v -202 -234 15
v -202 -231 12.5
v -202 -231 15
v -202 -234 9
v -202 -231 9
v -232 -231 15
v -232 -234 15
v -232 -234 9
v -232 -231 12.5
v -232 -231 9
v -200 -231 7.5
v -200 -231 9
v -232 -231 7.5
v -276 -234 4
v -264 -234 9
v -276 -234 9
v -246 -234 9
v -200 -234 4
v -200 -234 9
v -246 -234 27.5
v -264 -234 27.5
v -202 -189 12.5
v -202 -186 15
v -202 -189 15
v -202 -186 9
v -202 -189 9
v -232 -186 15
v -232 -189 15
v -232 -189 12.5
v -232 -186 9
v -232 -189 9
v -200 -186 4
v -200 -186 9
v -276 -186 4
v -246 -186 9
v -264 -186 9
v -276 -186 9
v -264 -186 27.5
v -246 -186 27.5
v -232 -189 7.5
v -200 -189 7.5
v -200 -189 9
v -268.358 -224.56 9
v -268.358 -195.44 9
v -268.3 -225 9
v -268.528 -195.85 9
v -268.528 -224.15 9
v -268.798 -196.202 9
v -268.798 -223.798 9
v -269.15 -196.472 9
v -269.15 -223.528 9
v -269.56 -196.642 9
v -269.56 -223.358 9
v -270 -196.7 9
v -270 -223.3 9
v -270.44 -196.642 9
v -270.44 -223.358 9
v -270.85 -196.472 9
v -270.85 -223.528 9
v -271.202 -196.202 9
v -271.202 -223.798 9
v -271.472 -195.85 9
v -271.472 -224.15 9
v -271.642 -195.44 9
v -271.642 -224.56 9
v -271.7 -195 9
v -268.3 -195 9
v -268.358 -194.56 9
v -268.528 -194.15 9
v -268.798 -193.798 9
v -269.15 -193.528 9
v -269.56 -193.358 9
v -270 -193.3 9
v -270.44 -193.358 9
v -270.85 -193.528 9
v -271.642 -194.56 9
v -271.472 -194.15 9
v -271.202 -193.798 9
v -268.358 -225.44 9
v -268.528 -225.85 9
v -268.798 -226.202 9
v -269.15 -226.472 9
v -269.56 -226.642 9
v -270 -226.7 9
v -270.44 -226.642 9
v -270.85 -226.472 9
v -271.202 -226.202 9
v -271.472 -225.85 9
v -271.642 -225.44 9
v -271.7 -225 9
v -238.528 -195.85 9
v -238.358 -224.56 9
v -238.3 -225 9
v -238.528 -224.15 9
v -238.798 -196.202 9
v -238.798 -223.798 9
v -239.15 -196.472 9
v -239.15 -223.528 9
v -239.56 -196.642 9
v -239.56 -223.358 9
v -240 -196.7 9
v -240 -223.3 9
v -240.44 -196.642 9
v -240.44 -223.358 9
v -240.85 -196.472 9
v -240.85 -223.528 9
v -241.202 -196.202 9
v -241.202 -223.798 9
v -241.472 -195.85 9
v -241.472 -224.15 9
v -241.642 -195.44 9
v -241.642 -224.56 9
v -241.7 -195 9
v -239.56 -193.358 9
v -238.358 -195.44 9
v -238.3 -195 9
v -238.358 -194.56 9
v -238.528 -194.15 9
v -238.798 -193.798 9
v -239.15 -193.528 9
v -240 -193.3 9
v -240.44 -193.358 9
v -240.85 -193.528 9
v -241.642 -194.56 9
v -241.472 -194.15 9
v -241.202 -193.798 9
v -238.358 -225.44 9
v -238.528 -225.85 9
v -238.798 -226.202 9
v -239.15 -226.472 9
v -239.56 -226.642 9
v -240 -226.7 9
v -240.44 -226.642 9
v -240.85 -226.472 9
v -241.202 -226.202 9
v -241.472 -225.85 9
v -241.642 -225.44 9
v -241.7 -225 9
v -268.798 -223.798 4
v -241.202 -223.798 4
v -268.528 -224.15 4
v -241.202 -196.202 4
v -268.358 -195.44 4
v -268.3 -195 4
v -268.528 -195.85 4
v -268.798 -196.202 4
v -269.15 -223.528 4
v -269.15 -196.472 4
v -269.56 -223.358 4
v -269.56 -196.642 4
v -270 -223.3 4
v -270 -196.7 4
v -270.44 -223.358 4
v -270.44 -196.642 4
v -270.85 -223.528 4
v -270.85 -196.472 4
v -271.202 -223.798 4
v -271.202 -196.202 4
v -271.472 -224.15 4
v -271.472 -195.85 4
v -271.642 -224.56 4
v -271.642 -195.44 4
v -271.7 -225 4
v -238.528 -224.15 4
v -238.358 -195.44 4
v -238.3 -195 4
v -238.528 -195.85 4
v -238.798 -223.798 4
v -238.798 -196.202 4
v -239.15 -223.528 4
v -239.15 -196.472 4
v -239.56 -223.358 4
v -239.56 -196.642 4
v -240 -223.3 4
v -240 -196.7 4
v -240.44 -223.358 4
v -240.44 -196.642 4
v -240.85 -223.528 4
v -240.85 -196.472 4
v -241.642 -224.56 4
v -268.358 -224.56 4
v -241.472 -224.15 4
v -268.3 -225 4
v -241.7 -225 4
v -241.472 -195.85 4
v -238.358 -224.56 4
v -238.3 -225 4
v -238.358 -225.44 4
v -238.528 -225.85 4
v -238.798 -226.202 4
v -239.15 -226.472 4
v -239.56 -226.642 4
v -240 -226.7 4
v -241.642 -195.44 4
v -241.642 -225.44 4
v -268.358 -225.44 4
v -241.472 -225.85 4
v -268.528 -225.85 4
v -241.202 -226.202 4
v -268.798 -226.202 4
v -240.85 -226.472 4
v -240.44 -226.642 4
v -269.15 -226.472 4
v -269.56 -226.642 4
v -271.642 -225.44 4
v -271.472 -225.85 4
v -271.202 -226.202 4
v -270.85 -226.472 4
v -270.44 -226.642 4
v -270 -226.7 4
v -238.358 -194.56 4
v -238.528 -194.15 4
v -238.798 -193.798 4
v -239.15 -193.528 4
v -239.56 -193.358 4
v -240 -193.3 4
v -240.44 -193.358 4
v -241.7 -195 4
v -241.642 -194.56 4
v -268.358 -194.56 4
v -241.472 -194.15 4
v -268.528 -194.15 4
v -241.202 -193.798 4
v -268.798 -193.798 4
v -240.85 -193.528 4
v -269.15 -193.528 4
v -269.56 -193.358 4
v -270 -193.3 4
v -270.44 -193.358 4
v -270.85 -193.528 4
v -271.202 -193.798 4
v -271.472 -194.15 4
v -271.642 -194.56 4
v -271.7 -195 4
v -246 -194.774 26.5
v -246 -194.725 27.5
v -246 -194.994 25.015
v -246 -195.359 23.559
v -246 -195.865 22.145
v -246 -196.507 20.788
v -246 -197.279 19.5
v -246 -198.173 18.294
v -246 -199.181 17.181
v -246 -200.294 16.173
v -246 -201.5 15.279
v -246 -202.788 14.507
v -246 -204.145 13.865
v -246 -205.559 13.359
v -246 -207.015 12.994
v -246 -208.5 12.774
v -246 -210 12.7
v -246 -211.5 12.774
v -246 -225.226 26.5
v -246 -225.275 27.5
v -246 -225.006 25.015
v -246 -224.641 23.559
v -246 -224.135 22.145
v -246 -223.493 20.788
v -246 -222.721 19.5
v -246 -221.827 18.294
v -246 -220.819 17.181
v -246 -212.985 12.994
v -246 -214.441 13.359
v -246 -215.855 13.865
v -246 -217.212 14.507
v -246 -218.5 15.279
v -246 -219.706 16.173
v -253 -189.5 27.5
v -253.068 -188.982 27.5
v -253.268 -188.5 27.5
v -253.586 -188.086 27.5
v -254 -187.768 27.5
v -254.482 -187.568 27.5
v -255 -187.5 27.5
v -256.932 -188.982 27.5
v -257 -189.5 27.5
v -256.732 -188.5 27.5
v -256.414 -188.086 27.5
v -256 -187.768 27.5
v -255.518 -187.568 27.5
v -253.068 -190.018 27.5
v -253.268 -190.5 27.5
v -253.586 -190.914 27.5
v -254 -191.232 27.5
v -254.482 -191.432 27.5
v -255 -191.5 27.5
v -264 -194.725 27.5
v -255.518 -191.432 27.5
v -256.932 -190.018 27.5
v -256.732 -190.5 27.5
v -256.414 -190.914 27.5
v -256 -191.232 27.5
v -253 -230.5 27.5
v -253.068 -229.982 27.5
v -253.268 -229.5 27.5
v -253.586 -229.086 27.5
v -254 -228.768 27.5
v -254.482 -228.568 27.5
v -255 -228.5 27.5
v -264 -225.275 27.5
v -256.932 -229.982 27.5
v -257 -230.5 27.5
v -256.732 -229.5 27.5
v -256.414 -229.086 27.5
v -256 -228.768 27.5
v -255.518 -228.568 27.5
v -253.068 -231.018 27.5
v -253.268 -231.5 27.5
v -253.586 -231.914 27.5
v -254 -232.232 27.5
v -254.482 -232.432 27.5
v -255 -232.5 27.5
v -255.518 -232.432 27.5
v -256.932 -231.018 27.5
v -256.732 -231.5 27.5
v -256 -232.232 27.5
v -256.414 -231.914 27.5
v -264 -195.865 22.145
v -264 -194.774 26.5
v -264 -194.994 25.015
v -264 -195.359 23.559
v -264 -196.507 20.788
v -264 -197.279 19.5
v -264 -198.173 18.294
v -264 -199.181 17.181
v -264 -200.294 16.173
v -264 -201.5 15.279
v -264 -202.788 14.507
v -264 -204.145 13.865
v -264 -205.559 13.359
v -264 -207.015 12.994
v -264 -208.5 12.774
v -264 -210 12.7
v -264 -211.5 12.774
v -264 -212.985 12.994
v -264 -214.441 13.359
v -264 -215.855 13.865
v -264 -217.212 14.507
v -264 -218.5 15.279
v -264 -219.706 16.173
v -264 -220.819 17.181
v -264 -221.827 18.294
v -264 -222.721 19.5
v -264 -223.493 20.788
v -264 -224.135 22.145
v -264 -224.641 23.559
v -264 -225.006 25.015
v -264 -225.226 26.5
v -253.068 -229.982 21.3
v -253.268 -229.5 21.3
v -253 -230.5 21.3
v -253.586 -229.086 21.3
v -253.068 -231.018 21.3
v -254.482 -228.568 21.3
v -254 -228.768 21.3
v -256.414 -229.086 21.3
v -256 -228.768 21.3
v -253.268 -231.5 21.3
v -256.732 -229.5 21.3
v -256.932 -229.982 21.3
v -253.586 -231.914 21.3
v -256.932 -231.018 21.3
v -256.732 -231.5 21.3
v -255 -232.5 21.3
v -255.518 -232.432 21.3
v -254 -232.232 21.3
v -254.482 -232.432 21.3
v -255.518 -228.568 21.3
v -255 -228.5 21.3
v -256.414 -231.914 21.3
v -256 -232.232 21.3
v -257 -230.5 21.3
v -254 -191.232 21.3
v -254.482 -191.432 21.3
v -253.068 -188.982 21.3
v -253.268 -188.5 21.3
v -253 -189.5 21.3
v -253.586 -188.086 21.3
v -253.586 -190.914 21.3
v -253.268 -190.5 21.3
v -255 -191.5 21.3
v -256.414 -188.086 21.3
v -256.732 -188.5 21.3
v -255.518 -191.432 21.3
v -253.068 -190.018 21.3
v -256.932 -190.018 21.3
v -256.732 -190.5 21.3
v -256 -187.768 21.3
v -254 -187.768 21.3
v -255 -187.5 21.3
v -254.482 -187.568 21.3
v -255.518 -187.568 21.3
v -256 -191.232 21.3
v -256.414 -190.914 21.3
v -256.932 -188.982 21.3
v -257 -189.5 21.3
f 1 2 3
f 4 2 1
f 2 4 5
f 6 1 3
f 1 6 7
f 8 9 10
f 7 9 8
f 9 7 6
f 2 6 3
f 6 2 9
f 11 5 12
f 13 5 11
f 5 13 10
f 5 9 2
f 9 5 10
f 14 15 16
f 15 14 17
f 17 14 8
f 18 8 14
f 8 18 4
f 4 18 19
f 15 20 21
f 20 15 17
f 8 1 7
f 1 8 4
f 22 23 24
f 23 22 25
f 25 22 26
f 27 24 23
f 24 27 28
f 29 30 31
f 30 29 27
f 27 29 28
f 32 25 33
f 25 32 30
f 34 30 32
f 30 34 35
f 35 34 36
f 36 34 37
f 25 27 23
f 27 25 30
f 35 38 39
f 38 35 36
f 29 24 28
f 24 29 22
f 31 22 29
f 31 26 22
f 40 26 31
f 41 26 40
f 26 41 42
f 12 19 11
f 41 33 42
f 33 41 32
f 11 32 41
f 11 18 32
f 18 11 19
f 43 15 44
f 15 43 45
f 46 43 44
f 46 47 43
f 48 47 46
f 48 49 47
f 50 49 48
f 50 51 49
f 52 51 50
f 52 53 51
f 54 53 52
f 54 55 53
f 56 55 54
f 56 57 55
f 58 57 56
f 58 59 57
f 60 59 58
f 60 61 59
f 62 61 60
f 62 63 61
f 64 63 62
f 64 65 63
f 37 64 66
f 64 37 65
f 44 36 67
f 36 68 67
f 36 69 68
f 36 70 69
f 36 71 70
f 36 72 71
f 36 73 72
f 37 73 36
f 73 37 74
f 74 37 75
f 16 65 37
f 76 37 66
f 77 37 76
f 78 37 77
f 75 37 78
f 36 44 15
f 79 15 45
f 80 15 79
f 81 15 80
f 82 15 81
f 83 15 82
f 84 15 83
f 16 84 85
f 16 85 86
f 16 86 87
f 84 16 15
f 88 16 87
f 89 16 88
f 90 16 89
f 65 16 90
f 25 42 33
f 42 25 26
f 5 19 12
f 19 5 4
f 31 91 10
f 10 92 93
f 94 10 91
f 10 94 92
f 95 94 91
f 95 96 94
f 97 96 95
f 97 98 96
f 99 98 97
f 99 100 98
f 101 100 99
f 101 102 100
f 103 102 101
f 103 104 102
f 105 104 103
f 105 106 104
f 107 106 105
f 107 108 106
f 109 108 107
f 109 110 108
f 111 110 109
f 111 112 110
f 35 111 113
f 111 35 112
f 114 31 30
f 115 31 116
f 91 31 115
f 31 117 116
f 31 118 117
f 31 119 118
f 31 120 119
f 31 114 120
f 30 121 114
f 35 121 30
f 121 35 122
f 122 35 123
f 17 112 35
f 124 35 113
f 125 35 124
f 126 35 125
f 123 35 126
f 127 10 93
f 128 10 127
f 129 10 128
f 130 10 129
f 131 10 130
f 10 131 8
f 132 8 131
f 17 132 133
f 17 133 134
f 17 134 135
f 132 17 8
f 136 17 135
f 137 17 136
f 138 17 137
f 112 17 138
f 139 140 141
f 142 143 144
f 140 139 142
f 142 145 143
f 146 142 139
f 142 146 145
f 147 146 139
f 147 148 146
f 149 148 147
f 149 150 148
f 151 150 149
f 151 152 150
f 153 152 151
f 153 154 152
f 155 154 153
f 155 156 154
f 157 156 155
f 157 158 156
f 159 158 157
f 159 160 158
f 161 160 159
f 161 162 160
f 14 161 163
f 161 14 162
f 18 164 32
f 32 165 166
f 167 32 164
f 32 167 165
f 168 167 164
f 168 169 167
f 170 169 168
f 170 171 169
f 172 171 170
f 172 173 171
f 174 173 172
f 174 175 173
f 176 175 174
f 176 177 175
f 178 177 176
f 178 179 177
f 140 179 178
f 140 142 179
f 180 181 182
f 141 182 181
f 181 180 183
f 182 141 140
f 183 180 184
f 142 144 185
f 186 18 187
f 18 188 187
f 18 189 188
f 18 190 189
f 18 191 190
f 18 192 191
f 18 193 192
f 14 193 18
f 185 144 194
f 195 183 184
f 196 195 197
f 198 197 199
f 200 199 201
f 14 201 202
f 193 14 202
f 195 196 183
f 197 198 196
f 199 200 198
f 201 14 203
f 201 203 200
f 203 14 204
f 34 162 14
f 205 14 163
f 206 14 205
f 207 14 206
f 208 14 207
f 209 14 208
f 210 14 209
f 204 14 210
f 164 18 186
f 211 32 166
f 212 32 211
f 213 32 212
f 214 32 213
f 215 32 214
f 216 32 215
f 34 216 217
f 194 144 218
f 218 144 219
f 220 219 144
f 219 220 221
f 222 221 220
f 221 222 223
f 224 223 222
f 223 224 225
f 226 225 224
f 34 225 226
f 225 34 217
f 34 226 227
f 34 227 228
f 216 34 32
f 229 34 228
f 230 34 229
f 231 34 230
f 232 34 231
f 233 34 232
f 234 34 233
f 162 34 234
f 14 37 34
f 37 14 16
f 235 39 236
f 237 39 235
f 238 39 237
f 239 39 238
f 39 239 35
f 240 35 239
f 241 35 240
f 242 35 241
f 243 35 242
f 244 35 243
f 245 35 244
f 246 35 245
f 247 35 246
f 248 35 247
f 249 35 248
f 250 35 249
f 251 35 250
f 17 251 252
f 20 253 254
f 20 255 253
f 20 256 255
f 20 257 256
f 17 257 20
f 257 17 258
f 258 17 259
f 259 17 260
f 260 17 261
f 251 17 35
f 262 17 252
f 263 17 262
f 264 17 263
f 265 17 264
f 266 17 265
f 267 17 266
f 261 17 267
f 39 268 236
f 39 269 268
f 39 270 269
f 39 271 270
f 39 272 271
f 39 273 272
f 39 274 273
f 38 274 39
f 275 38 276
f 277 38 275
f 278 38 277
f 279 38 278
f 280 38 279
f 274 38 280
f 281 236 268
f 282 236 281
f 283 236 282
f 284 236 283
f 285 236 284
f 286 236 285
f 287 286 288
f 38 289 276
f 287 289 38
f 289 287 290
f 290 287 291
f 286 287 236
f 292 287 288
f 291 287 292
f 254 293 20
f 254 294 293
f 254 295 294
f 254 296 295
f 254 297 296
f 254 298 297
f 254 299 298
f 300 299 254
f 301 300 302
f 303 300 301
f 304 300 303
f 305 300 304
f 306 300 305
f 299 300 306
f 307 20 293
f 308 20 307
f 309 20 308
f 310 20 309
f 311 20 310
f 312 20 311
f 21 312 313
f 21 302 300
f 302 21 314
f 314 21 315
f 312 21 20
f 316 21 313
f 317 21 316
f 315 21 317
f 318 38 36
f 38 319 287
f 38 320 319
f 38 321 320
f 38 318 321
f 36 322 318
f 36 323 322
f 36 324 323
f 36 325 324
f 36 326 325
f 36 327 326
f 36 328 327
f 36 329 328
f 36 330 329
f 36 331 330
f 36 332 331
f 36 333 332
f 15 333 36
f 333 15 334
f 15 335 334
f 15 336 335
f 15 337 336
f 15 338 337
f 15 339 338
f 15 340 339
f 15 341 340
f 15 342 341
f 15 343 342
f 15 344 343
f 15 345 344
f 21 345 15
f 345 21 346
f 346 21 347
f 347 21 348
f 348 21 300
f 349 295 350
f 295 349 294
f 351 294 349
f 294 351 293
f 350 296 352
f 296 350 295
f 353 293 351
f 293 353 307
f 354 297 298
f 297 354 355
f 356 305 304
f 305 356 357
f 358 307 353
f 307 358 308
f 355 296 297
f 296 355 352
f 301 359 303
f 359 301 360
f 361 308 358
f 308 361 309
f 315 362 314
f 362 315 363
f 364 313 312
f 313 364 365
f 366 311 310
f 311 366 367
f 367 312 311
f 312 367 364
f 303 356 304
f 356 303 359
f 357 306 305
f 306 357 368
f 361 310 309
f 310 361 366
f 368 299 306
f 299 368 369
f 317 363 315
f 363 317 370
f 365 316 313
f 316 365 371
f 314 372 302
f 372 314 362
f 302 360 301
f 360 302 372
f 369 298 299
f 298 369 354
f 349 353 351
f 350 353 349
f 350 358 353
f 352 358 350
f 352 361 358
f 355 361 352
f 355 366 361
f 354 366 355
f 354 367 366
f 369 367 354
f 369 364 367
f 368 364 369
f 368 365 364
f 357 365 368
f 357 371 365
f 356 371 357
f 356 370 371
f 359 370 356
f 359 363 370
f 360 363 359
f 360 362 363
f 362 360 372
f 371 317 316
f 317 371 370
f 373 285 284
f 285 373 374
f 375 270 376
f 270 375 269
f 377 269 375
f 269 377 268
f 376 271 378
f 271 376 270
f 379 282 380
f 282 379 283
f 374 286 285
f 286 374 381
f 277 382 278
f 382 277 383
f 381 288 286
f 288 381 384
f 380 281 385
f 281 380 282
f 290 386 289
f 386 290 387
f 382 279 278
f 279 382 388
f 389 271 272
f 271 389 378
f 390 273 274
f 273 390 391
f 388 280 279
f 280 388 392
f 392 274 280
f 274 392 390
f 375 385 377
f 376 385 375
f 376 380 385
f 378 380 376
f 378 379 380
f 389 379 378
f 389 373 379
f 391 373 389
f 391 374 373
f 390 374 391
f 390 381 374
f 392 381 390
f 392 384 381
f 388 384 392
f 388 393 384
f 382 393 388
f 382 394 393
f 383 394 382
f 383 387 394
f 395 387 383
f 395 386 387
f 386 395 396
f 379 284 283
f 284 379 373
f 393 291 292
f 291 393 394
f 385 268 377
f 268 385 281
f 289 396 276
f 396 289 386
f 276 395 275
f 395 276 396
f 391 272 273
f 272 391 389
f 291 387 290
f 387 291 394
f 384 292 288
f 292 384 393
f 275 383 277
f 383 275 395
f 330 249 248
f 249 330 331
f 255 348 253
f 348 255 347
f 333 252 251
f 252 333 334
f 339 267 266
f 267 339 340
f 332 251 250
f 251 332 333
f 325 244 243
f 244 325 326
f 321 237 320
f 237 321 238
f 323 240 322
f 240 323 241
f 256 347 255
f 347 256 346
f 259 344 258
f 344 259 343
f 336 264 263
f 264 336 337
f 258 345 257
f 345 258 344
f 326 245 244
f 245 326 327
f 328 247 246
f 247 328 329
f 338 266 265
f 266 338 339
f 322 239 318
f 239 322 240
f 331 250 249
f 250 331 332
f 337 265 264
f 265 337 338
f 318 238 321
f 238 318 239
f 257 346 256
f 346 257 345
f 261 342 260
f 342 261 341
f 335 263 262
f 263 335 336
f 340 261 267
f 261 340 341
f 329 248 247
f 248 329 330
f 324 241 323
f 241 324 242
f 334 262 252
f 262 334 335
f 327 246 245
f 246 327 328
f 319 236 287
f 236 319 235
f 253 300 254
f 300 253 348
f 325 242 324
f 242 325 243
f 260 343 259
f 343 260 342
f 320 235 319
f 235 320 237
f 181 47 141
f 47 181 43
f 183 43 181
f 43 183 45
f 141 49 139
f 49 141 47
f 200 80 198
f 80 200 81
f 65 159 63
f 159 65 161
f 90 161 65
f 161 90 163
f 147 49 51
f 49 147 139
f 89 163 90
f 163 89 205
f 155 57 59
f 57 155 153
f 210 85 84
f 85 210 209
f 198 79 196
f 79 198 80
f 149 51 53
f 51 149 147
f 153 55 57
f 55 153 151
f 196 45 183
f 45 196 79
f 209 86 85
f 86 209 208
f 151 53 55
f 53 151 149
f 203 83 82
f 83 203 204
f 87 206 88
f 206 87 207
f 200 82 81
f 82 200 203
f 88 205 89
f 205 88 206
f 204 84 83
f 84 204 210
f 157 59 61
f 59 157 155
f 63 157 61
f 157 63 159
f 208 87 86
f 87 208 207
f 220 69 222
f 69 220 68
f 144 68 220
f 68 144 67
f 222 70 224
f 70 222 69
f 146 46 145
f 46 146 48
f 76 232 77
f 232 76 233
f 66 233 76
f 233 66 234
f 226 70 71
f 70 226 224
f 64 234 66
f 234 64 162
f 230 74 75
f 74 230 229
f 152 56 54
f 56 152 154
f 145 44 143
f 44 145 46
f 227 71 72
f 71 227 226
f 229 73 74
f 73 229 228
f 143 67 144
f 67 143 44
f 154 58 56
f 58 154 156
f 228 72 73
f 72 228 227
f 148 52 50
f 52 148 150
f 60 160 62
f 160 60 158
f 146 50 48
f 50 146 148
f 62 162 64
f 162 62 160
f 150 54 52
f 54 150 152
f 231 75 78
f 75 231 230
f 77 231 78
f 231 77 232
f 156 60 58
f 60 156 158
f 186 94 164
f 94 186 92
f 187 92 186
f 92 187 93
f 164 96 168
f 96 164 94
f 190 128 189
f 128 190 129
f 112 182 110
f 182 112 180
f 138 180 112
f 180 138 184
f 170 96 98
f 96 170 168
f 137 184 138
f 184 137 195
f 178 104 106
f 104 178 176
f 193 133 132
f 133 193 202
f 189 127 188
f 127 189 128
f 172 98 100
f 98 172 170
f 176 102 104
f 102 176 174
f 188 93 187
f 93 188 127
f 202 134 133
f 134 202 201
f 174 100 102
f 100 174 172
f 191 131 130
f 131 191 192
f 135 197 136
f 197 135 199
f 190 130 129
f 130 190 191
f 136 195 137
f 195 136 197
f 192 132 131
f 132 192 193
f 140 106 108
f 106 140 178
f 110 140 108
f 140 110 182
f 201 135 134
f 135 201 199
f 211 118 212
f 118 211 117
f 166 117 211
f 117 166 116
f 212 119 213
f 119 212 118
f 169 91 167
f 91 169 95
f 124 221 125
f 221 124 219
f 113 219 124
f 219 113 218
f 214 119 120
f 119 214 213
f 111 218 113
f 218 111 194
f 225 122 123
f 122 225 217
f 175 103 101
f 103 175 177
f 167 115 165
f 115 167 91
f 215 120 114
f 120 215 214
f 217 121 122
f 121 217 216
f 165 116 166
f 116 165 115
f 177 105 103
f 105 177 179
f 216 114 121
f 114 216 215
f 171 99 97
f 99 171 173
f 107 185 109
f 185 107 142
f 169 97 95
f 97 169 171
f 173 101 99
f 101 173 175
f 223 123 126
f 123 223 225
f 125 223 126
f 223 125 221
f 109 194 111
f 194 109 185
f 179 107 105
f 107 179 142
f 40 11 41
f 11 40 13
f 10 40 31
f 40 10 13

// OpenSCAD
// file: ../machine_frame.scad
// =============================================
// Riftbound Card Sorter — shared machine frame
// =============================================
// Single source of truth for the card path after the Nov 11 redesign
// (suction pick from a motor-raised hopper, raised transport line,
// cradle shuttle sorter). Machine coords as in assembly.scad:
//   X = card travel (hopper -> belt -> tray), Y = across belt (+Y = back,
//   electronics side), Z = up, Z=0 bottom of baseplate tiles.
// `use <machine_frame.scad>` does not import variables, so read these via
// the functions at the bottom.
// =============================================

base_top   = 4;      // top of baseplate tiles
riser_h    = 60;     // conveyor deck raised so cards can FALL into both tray floors
deck_z     = base_top + riser_h;          // rail base / hopper deck reference = 64

// Conveyor (geometry unchanged, just lifted by riser_h)
belt_x0    = -165;   // belt start
belt_x1    = 85;     // belt end
roller_x   = [-140, 60];
rail_in    = 45;     // |Y| of rail inner faces
shaft_z    = deck_z + 15;
card_z     = deck_z + 15 + 11.9;          // top of round belts = card face = 90.9
scan_flat  = [-127, 47];                  // slide-bed backed flat zone (X)

// Scanner
cam_x      = 5;      // lens axis; card centred here for capture (moved from -40 so the hood clears the arm drop zone at X -139..-51)

// Hopper (motor-raised floor keeps top card at card_z)
hopper_x   = -215;   // cavity centre X (Y = 0)

// Baseplate extents (3x3 tiles of 190x180)
base_x     = [-285, 285];
base_y     = [-270, 270];

// Pick & place hand-off
drop_x     = -95;    // card CENTRE when the suction arm releases it onto the belt
                     // (card spans -139..-51: on belts, clear of hopper wall)
drop_clear = 3;      // card underside this far above belt at release (low drop)

// Sorting tray (bottom on baseplate); owner of tray placement may move it in X
tray_floor_lower_z = base_top + 2.5;      // lower slot floor
tray_floor_upper_z = base_top + 65 + 3 + 2.5;  // = 74.5 upper slot floor

// Card
card_w = 63; card_l = 88; card_t = 0.33;  // RAW cards (owner confirmed 2026-11-11: no sleeves), ~1.75 g

// MG996R mounting-tab holes (all three servos: pick arm ch0, shuttle ch1 / ch2).
// ONE value for every mount: hole-centre pitch along the case (49.5, TowerPro
// MG996R drawing) × across it (10), symmetric about the case centre. Clones
// vary (48.5..50 seen); the servo's own tab holes are Ø4.5+ grommet holes, so
// an M3 / M2.5 still lands for ±0.7 mm. MEASURE YOUR SERVO; if it is further
// off, change it here and re-export the arm head and the shuttle end post / riser.
mg996r_hole_pitch = 49.5;
mg996r_hole_dx    = 10;

function frame_base_top()  = base_top;
function frame_riser_h()   = riser_h;
function frame_deck_z()    = deck_z;
function frame_belt_x0()   = belt_x0;
function frame_belt_x1()   = belt_x1;
function frame_roller_x()  = roller_x;
function frame_rail_in()   = rail_in;
function frame_card_z()    = card_z;
function frame_scan_flat() = scan_flat;
function frame_cam_x()     = cam_x;
function frame_hopper_x()  = hopper_x;
function frame_base_x()    = base_x;
function frame_base_y()    = base_y;
function frame_drop_x()    = drop_x;
function frame_drop_clear()= drop_clear;
function frame_tray_floor_lower_z() = tray_floor_lower_z;
function frame_tray_floor_upper_z() = tray_floor_upper_z;
function frame_mg996r_hole_pitch() = mg996r_hole_pitch;
function frame_mg996r_hole_dx()    = mg996r_hole_dx;
// file: hw_common.scad
// Visual-only hardware for the v3 assembly video (render_v2/w_*.scad). Not printed.
// Screws are drawn with the origin at the underside of the head (the bearing face)
// and the tip along `dir` (default straight down). Lengths are nominal (mm).

// rotate so that local -Z points along v
module point_tip(v = [0, 0, -1]) {
    n = norm(v); u = v / n;
    if (u[2] < -0.9999) children();
    else if (u[2] > 0.9999) rotate([180, 0, 0]) children();
    else rotate(a = acos(-u[2]), v = cross([0, 0, -1], u)) children();
}

// socket head cap screw: head Ø5.5 × 3 above the origin, shank down
module shcs(L, d = 3, hd = 5.5, hh = 3) {
    cylinder(d = hd, h = hh, $fn = 20);
    translate([0, 0, -L]) cylinder(d = d, h = L + 0.01, $fn = 12);
}
// button head (ISO 7380)
module bhcs(L, d = 3, hd = 5.7, hh = 1.65) {
    cylinder(d1 = hd, d2 = hd * 0.75, h = hh, $fn = 20);
    translate([0, 0, -L]) cylinder(d = d, h = L + 0.01, $fn = 12);
}
// countersunk (ISO 10642): head top at the origin, cone below it
module csk(L, d = 3, hd = 6) {
    translate([0, 0, -(hd - d) / 2]) cylinder(d1 = d, d2 = hd, h = (hd - d) / 2, $fn = 20);
    translate([0, 0, -L]) cylinder(d = d, h = L, $fn = 12);
}
// set screw (no head), top at the origin
module setscrew(L, d = 3) translate([0, 0, -L]) cylinder(d = d, h = L, $fn = 12);
module hexnut(d = 3, af = 5.5, h = 2.4) difference() {
    cylinder(d = af / cos(30), h = h, $fn = 6);
    translate([0, 0, -1]) cylinder(d = d, h = h + 2, $fn = 12);
}
module washer(d = 3.2, od = 7, t = 0.5) difference() { cylinder(d = od, h = t, $fn = 24); translate([0, 0, -1]) cylinder(d = d, h = t + 2, $fn = 12); }

// place a screw at p with its tip along dir
module at_screw(p, dir = [0, 0, -1]) translate(p) point_tip(dir) children();

// M3 four-prong tee-nut, flange on the board underside at z, barrel up into the board
module teenut(p, z) translate([p[0], p[1], z]) {
    translate([0, 0, -0.9]) difference() { cylinder(d = 13, h = 0.9, $fn = 32); translate([0, 0, -1]) cylinder(d = 3, h = 3, $fn = 12); }
    difference() { cylinder(d = 4.5, h = 5, $fn = 20); translate([0, 0, -1]) cylinder(d = 3, h = 7, $fn = 12); }
    for (a = [45 : 90 : 315]) rotate(a) translate([5.2, -0.7, 0]) cube([1.2, 1.4, 3]);
}

// cable / tube as a hull chain of spheres
module chain(pts, d = 4) for (i = [0 : len(pts) - 2])
    hull() for (p = [pts[i], pts[i + 1]]) translate(p) sphere(d = d, $fn = 12);
// main file
// v3 assembly video: pump bracket, pump, vent-valve clip and valve (step 11, §14.6).
// openscad --backend=manifold -D 'part="v3_pb_base"' -o pb_base.stl w_pump.scad
include <../pump_bracket.scad>
include <hw_common.scad>
part = "v3_pb_base";
P = part;
module base_screws() for (h = holes) at_screw([h[0], h[1], bt + base_t]) shcs(20);
module cap_screws() for (s = [-1, 1]) at_screw([sad_x0 + sad_w / 2, pump_y + s * ear_y, pump_z + gap / 2 + ear_t]) shcs(10);
module clip_screws() for (h = vc_holes) at_screw([h[0], h[1], bt + vc_t]) shcs(20);
module valve_foam() translate([vv_x - 7, vv_y0 + 2, vc_floor]) cube([14, 16, vfoam]);
// 1N5819 across the pump terminals (rear end of the can)
module pump_diode() translate([can_x0 - 3, pump_y, pump_z]) rotate([90, 0, 0]) {
    cylinder(d = 2.7, h = 5.2, center = true, $fn = 16);
    for (s = [-1, 1]) translate([0, 0, s * 4.5]) cylinder(d = 0.8, h = 4, center = true, $fn = 8);
}

if (P == "v3_pb_base") bracket_base();
if (P == "v3_pb_basescr") base_screws();
if (P == "v3_pb_sleeve") bracket_sleeve();
if (P == "v3_pb_pad") bracket_pad();
if (P == "v3_pb_pump") hw_pump();
if (P == "v3_pb_cap") bracket_cap();
if (P == "v3_pb_capscr") cap_screws();
if (P == "v3_pb_diode") pump_diode();
if (P == "v3_pb_clip") valve_clip();
if (P == "v3_pb_clipscr") clip_screws();
if (P == "v3_pb_foam") valve_foam();
if (P == "v3_pb_valve") hw_valve();
if (P == "v3_pb_tee") hw_tee();
